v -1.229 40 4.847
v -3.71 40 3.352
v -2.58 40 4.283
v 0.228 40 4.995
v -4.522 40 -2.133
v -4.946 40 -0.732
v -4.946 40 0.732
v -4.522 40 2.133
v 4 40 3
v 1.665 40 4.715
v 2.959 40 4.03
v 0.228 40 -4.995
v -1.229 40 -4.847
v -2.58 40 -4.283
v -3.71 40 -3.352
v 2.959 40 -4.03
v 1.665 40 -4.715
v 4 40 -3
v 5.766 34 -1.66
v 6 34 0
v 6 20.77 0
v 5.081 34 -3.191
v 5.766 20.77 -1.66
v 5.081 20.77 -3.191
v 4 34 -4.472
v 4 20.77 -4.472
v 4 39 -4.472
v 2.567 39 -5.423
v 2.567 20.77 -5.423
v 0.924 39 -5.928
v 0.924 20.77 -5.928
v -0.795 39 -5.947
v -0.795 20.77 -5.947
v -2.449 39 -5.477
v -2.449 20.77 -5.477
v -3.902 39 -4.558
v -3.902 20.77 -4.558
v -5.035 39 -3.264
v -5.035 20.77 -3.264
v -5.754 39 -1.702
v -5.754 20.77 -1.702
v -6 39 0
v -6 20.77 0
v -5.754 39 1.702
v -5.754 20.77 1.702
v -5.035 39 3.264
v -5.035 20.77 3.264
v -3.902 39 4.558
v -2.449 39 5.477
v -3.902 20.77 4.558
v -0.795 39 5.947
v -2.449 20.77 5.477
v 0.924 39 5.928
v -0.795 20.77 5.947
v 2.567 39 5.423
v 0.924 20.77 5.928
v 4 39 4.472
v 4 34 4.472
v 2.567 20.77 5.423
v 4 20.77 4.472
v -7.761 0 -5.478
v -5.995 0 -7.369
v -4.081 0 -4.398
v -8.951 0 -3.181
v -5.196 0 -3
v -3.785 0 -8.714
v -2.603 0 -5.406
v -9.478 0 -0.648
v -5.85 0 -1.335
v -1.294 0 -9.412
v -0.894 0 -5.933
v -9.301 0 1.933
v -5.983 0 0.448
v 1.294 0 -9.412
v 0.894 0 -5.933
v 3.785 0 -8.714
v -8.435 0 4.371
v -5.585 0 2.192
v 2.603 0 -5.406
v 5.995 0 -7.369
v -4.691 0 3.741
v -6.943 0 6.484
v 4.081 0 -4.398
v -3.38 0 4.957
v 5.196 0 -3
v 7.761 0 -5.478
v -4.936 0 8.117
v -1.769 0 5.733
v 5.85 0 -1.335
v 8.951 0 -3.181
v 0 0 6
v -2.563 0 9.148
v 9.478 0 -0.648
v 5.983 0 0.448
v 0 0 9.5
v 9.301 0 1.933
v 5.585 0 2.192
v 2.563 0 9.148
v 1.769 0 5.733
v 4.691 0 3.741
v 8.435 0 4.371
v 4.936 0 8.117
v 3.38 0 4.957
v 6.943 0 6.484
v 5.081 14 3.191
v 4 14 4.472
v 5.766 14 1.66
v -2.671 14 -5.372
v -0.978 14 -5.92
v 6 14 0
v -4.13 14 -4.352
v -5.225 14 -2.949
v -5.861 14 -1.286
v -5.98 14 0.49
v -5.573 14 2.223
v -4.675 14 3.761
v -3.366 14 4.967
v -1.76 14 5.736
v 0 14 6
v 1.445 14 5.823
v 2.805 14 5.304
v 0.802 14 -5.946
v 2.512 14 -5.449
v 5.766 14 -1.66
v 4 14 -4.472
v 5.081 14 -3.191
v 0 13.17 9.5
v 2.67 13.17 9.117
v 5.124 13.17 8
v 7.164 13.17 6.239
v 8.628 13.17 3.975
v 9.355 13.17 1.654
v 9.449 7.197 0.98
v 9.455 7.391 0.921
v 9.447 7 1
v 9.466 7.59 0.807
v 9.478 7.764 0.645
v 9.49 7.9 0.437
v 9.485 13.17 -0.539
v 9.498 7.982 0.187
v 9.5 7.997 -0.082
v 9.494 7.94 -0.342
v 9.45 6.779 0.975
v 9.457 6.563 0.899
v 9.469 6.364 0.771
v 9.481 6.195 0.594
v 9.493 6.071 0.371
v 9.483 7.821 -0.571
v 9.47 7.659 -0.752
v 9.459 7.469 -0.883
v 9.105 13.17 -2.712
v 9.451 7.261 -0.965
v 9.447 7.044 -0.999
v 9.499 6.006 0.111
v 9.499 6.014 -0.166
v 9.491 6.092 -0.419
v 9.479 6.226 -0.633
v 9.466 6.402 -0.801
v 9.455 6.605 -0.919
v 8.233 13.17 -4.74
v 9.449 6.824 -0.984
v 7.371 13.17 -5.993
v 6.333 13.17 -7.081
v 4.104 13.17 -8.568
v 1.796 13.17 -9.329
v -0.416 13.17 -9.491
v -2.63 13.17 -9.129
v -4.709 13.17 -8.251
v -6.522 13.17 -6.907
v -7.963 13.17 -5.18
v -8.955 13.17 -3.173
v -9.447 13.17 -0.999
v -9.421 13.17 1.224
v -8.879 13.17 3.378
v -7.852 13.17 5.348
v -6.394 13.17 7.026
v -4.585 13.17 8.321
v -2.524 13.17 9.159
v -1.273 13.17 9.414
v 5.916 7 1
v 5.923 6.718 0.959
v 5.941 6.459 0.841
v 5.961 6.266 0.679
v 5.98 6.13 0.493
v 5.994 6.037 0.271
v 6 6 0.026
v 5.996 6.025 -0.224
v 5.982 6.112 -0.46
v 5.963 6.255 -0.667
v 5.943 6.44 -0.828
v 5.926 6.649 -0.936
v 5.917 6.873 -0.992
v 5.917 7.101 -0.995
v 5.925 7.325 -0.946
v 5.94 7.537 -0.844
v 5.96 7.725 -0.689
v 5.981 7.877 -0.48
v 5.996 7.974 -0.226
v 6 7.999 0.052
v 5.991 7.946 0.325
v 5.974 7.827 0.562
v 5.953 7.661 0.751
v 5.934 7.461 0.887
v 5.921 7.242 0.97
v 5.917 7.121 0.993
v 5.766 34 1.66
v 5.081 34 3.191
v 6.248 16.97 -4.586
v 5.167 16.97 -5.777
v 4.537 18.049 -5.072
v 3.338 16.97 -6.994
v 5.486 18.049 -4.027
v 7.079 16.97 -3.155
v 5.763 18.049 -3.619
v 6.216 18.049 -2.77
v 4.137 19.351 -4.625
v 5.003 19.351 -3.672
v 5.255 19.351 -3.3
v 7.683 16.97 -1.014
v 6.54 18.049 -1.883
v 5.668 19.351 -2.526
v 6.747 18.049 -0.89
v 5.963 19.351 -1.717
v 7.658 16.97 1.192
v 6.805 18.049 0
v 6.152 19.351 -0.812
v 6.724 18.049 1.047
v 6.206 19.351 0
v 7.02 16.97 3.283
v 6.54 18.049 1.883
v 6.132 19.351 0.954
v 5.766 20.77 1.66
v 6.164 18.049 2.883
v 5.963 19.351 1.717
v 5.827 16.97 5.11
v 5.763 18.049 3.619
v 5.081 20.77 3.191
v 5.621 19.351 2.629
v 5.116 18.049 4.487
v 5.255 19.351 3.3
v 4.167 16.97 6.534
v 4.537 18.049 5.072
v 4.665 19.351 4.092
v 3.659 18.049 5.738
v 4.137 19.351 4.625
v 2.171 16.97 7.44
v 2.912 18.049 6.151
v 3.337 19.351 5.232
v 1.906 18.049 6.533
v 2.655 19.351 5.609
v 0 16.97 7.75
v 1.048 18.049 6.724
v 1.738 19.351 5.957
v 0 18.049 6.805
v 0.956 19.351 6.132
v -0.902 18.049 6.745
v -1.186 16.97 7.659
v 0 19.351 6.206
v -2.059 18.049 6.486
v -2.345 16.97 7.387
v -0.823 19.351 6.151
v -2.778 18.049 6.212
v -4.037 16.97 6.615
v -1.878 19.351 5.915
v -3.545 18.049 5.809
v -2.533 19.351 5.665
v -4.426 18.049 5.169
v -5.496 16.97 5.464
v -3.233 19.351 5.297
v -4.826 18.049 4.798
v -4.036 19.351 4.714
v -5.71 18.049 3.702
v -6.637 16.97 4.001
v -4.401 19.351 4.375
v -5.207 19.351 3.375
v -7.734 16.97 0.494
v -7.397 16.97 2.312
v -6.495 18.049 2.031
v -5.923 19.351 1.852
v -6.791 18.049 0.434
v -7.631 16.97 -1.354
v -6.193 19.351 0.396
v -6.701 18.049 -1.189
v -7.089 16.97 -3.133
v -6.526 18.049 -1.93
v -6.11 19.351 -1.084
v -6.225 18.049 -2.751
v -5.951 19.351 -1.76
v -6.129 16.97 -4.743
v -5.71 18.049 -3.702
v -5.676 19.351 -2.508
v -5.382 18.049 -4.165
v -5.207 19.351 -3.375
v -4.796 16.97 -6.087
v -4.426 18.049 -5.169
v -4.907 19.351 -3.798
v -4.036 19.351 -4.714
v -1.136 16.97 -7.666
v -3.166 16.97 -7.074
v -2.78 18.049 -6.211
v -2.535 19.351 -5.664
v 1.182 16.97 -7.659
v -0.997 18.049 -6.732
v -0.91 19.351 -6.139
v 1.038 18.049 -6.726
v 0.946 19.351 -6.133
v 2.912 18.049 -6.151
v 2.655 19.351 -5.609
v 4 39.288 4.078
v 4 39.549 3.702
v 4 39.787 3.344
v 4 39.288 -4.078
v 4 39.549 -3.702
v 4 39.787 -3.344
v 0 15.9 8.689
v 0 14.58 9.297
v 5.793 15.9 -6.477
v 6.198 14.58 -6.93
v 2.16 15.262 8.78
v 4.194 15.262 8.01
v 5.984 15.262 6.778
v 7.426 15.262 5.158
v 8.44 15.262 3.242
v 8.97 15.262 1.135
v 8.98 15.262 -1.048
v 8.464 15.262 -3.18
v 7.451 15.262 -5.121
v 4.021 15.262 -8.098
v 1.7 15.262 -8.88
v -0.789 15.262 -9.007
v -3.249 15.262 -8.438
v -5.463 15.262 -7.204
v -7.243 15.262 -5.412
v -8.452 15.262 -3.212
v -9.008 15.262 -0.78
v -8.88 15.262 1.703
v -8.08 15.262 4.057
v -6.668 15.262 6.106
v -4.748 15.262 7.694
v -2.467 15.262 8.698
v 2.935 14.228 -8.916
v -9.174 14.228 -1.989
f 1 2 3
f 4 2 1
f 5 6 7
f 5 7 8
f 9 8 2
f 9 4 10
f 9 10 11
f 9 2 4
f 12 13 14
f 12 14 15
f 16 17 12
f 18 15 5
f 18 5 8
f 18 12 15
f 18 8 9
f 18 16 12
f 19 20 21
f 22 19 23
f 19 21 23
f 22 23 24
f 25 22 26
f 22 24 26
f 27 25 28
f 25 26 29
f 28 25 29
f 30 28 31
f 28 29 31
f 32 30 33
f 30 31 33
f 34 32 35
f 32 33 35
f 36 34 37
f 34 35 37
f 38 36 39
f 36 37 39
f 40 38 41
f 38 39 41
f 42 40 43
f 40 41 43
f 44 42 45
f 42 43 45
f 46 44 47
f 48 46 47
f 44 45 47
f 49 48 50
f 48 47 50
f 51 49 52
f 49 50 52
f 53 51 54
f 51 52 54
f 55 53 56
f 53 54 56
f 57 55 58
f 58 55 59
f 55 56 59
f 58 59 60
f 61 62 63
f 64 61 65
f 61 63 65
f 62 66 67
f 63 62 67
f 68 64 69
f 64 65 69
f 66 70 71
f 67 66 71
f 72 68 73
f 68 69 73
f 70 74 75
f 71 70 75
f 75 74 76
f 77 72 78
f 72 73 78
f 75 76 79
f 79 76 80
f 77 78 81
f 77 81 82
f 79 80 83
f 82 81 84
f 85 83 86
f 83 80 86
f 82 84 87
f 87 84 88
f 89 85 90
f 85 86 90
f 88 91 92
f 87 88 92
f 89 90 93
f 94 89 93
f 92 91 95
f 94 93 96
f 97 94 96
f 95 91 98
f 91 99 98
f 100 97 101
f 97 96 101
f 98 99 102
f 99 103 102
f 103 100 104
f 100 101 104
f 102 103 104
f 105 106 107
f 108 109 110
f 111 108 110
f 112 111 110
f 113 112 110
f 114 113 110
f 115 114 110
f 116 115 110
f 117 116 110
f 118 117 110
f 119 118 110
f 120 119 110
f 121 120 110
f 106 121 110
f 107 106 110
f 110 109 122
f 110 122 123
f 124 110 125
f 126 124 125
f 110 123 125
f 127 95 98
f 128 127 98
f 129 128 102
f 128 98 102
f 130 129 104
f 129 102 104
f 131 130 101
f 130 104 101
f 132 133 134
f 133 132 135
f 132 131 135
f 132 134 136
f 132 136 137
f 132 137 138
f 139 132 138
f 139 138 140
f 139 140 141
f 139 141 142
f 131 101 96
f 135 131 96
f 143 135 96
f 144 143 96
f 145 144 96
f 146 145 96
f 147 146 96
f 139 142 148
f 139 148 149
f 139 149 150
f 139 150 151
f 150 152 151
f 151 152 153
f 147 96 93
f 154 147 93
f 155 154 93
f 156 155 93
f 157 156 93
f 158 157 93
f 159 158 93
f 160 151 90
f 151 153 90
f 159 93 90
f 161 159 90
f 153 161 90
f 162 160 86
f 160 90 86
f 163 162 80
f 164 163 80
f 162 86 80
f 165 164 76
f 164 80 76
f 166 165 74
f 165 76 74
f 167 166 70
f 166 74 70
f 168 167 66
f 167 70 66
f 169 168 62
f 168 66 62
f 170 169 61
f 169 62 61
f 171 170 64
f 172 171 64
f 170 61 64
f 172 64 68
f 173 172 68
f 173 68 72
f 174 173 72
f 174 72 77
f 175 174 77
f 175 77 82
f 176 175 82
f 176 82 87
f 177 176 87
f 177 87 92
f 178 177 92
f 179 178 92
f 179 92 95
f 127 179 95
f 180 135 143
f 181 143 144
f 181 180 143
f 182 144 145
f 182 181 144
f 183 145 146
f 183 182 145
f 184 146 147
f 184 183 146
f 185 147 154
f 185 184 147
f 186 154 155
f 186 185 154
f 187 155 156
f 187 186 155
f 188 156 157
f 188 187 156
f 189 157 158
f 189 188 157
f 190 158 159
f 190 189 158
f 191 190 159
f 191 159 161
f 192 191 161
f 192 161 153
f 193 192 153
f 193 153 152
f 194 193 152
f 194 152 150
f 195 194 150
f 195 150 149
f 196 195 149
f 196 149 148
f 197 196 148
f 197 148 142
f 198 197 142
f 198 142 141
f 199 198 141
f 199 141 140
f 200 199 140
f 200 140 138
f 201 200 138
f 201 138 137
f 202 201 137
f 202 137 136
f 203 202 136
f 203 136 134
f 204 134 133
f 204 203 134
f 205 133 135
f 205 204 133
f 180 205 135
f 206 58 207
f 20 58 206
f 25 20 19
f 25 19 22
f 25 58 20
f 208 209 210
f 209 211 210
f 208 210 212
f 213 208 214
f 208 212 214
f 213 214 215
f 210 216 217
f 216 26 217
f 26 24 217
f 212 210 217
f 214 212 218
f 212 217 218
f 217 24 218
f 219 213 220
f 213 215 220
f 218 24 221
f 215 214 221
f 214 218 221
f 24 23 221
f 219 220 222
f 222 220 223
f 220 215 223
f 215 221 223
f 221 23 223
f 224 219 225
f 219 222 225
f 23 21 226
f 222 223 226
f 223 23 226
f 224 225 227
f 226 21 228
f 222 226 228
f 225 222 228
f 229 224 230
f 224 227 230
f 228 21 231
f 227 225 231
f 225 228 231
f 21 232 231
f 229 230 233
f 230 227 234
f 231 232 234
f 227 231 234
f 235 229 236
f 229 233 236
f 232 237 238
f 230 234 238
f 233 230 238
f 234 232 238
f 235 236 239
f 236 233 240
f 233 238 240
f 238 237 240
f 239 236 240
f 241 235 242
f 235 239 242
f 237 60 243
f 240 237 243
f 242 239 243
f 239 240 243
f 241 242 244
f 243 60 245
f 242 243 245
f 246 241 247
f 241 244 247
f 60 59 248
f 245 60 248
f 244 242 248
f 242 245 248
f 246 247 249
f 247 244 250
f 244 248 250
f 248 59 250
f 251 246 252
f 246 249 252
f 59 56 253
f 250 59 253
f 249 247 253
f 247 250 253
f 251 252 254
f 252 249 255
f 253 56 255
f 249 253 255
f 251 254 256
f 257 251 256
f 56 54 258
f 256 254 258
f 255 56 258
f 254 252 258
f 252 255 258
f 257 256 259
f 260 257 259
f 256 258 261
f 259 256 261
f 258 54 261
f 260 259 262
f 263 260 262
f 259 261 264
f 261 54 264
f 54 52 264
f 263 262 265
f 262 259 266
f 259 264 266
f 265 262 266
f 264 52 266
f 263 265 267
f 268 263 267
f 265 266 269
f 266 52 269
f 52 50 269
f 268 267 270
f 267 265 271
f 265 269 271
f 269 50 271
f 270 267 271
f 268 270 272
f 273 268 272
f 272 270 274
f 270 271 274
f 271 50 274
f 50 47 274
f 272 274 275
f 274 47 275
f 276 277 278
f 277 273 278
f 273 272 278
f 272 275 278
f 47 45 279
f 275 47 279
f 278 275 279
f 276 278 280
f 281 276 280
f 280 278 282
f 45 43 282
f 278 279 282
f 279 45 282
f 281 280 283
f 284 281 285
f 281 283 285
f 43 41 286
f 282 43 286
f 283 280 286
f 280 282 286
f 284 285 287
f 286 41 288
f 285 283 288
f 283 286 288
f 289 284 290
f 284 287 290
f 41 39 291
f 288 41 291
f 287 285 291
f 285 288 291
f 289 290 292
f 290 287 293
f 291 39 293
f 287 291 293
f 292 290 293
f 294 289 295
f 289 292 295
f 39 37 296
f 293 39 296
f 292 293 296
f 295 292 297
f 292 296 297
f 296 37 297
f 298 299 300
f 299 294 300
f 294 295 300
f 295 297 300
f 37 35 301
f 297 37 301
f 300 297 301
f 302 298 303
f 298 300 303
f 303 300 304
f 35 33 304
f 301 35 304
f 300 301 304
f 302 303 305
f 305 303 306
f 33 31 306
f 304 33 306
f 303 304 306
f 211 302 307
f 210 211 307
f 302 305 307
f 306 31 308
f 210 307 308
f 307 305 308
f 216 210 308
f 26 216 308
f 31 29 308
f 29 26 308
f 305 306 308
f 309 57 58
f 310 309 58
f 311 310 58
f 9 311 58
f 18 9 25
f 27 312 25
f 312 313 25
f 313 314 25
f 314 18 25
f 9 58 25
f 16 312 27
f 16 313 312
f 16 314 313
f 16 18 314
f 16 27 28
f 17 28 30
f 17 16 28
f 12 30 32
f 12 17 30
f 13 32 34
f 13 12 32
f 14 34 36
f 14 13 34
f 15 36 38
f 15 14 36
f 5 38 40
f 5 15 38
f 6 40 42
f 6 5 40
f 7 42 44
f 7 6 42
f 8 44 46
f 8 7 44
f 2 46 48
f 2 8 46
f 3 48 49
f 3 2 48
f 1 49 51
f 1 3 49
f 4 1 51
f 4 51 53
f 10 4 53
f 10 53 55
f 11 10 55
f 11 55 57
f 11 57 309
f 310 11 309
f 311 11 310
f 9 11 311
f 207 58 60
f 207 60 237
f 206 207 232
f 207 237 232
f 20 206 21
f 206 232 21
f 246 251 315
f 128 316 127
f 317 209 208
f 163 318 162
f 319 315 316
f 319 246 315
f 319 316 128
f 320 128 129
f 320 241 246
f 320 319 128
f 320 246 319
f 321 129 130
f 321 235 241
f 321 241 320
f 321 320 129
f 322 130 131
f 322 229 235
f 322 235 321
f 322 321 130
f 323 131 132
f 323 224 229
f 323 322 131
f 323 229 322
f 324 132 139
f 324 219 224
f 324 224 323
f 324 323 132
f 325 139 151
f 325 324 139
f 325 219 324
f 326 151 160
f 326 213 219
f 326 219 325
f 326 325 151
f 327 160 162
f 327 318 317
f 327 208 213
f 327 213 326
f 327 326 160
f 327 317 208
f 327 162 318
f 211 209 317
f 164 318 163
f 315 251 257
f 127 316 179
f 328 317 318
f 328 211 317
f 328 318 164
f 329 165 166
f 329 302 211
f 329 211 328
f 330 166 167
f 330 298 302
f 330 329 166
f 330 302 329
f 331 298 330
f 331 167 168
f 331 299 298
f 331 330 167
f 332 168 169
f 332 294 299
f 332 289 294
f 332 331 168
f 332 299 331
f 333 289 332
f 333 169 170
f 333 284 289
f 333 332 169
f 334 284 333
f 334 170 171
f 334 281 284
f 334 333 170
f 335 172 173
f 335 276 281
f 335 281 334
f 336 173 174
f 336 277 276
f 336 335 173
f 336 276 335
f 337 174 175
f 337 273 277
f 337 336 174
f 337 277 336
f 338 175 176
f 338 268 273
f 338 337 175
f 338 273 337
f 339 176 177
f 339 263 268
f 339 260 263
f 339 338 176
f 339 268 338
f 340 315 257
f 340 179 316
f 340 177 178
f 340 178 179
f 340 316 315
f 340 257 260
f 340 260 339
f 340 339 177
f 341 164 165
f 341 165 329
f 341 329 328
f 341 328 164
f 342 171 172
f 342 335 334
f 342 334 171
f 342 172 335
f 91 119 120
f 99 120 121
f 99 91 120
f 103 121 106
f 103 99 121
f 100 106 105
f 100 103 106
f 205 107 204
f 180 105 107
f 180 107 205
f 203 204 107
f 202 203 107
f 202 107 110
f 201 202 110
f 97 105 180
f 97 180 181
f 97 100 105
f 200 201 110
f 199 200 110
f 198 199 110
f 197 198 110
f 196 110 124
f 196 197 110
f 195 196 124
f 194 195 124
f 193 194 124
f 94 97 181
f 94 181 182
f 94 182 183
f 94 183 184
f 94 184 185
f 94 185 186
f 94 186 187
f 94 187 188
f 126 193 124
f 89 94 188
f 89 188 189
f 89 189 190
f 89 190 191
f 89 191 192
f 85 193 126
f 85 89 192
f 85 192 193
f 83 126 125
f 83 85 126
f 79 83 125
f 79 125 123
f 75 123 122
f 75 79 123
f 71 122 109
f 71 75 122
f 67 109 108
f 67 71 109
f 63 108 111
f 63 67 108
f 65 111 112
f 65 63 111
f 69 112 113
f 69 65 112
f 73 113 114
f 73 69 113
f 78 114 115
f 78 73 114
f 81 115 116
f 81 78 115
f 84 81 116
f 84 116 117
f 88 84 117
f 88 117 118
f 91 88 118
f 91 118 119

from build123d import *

# Parameters (mm, degrees)
SKETCH1_R               = 9.5
SKETCH1_R_2             = 6
BOSS_EXTRUDE1_DEPTH     = 16
BOSS_EXTRUDE2_START     = 14
BOSS_EXTRUDE2_DEPTH     = 26
BOSS_EXTRUDE5_START     = 14
BOSS_EXTRUDE5_DEPTH     = 20
CUT_EXTRUDE1_REACH      = 44.196
CUT_EXTRUDE1_END_RADIUS = 9.5
SKETCH2_R               = 1
CHAMFER1_SIZE           = 1
FILLET2_R               = 5
FILLET3_R               = 5


with BuildPart() as part:
    # Sketch1 → Boss-Extrude1 (new body)
    with BuildSketch(Plane(origin=(0, 0, 0), x_dir=(1, 0, 0), z_dir=(0, 1, 0))):
        with Locations(Location((0, 0, 0), (0, 0, 270))):
            Circle(SKETCH1_R)
        with Locations(Location((0, 0, 0), (0, 0, 270))):
            Circle(SKETCH1_R_2, mode=Mode.SUBTRACT)
    extrude(amount=BOSS_EXTRUDE1_DEPTH)



with BuildPart() as body_2:
    # Sketch1<3> → Boss-Extrude2 (new body)
    with BuildSketch(Plane(origin=(0, 0, 0), x_dir=(1, 0, 0), z_dir=(0, 1, 0)).offset(BOSS_EXTRUDE2_START)):
        with BuildLine():
            Line((4, -4.472135955), (4, 4.472135955))
            ThreePointArc((4, 4.472135955), (-6, 0), (4, -4.472135955))
        make_face()
    extrude(amount=BOSS_EXTRUDE2_DEPTH)


with BuildPart() as part_1:
    add(part.part)

    add(body_2.part)  # Boss-Extrude5 merges body 2
    # Sketch1<5> → Boss-Extrude5 (add)
    with BuildSketch(Plane(origin=(0, 0, 0), x_dir=(1, 0, 0), z_dir=(0, 1, 0)).offset(BOSS_EXTRUDE5_START)):
        with BuildLine():
            ThreePointArc((6, 0), (5.477225575, 2.449489743), (4, 4.472135955))
            Line((4, 4.472135955), (4, -4.472135955))
            ThreePointArc((4, -4.472135955), (5.477225575, -2.449489743), (6, 0))
        make_face()
        with BuildLine():
            Line((4, -4.472135955), (4, 4.472135955))
            ThreePointArc((4, 4.472135955), (-6, 0), (4, -4.472135955))
        make_face()
    extrude(amount=BOSS_EXTRUDE5_DEPTH)

    # Cut-Extrude1: up to this cylinder (the profile starts inside it)
    cut_extrude1_end = Plane(origin=(0, 7, 0), z_dir=(0, -1, 0)) * Cylinder(CUT_EXTRUDE1_END_RADIUS, 108.392, mode=Mode.PRIVATE)
    # Sketch2 → Cut-Extrude1 (cut, up to the surface)
    with BuildSketch(Plane(origin=(0, 0, 0), x_dir=(0, 0, -1), z_dir=(1, 0, 0)), mode=Mode.PRIVATE) as cut_extrude1_sk1:
        with Locations(Location((0, 7, 0), (0, 0, 180))):
            Circle(SKETCH2_R)
    cut_extrude1_tool1 = extrude(cut_extrude1_sk1.sketch, amount=CUT_EXTRUDE1_REACH, mode=Mode.PRIVATE) & cut_extrude1_end
    add(cut_extrude1_tool1.solids().sort_by_distance((0, 7, 0))[0], mode=Mode.SUBTRACT)

    # Chamfer1
    chamfer1_edges = [part_1.edges().sort_by_distance(p)[0] for p in [
        (-6, 40, 0),
    ]]
    chamfer(chamfer1_edges, length=CHAMFER1_SIZE)

    # Fillet2
    # the kernel refuses this fillet: 5 mm, written as the material it adds along each edge
    with BuildSketch(Plane(origin=(0, 16, 0), x_dir=(0.6666666666667012, 0, -0.745355992499899), z_dir=(-0.745355992499899, 0, -0.6666666666667012))) as fillet2_piece_1:
        with BuildLine():
            CenterArc((11, -4.769696007), FILLET2_R, 107.457603124, 72.542396876)
            Line((9.5, 0), (9.47, 0.09539392))
            ThreePointArc((9.47, 0.09539392), (7.75, 0.1), (6, 0.1))
            Line((6, 0.1), (5.9, 0))
            Line((5.9, 0), (5.9, -4.769696007))
            Line((5.9, -4.769696007), (6, -4.769696007))
        make_face()
    revolve(axis=Axis((0, 16, 0), (0, -1, 0)))

    # Fillet3
    fillet3_edges = [part_1.edges().sort_by_distance(p)[0] for p in [
        (8.87463741, 16, 3.389809853),
    ]]
    fillet(fillet3_edges, radius=FILLET3_R)


solid = part_1.part
